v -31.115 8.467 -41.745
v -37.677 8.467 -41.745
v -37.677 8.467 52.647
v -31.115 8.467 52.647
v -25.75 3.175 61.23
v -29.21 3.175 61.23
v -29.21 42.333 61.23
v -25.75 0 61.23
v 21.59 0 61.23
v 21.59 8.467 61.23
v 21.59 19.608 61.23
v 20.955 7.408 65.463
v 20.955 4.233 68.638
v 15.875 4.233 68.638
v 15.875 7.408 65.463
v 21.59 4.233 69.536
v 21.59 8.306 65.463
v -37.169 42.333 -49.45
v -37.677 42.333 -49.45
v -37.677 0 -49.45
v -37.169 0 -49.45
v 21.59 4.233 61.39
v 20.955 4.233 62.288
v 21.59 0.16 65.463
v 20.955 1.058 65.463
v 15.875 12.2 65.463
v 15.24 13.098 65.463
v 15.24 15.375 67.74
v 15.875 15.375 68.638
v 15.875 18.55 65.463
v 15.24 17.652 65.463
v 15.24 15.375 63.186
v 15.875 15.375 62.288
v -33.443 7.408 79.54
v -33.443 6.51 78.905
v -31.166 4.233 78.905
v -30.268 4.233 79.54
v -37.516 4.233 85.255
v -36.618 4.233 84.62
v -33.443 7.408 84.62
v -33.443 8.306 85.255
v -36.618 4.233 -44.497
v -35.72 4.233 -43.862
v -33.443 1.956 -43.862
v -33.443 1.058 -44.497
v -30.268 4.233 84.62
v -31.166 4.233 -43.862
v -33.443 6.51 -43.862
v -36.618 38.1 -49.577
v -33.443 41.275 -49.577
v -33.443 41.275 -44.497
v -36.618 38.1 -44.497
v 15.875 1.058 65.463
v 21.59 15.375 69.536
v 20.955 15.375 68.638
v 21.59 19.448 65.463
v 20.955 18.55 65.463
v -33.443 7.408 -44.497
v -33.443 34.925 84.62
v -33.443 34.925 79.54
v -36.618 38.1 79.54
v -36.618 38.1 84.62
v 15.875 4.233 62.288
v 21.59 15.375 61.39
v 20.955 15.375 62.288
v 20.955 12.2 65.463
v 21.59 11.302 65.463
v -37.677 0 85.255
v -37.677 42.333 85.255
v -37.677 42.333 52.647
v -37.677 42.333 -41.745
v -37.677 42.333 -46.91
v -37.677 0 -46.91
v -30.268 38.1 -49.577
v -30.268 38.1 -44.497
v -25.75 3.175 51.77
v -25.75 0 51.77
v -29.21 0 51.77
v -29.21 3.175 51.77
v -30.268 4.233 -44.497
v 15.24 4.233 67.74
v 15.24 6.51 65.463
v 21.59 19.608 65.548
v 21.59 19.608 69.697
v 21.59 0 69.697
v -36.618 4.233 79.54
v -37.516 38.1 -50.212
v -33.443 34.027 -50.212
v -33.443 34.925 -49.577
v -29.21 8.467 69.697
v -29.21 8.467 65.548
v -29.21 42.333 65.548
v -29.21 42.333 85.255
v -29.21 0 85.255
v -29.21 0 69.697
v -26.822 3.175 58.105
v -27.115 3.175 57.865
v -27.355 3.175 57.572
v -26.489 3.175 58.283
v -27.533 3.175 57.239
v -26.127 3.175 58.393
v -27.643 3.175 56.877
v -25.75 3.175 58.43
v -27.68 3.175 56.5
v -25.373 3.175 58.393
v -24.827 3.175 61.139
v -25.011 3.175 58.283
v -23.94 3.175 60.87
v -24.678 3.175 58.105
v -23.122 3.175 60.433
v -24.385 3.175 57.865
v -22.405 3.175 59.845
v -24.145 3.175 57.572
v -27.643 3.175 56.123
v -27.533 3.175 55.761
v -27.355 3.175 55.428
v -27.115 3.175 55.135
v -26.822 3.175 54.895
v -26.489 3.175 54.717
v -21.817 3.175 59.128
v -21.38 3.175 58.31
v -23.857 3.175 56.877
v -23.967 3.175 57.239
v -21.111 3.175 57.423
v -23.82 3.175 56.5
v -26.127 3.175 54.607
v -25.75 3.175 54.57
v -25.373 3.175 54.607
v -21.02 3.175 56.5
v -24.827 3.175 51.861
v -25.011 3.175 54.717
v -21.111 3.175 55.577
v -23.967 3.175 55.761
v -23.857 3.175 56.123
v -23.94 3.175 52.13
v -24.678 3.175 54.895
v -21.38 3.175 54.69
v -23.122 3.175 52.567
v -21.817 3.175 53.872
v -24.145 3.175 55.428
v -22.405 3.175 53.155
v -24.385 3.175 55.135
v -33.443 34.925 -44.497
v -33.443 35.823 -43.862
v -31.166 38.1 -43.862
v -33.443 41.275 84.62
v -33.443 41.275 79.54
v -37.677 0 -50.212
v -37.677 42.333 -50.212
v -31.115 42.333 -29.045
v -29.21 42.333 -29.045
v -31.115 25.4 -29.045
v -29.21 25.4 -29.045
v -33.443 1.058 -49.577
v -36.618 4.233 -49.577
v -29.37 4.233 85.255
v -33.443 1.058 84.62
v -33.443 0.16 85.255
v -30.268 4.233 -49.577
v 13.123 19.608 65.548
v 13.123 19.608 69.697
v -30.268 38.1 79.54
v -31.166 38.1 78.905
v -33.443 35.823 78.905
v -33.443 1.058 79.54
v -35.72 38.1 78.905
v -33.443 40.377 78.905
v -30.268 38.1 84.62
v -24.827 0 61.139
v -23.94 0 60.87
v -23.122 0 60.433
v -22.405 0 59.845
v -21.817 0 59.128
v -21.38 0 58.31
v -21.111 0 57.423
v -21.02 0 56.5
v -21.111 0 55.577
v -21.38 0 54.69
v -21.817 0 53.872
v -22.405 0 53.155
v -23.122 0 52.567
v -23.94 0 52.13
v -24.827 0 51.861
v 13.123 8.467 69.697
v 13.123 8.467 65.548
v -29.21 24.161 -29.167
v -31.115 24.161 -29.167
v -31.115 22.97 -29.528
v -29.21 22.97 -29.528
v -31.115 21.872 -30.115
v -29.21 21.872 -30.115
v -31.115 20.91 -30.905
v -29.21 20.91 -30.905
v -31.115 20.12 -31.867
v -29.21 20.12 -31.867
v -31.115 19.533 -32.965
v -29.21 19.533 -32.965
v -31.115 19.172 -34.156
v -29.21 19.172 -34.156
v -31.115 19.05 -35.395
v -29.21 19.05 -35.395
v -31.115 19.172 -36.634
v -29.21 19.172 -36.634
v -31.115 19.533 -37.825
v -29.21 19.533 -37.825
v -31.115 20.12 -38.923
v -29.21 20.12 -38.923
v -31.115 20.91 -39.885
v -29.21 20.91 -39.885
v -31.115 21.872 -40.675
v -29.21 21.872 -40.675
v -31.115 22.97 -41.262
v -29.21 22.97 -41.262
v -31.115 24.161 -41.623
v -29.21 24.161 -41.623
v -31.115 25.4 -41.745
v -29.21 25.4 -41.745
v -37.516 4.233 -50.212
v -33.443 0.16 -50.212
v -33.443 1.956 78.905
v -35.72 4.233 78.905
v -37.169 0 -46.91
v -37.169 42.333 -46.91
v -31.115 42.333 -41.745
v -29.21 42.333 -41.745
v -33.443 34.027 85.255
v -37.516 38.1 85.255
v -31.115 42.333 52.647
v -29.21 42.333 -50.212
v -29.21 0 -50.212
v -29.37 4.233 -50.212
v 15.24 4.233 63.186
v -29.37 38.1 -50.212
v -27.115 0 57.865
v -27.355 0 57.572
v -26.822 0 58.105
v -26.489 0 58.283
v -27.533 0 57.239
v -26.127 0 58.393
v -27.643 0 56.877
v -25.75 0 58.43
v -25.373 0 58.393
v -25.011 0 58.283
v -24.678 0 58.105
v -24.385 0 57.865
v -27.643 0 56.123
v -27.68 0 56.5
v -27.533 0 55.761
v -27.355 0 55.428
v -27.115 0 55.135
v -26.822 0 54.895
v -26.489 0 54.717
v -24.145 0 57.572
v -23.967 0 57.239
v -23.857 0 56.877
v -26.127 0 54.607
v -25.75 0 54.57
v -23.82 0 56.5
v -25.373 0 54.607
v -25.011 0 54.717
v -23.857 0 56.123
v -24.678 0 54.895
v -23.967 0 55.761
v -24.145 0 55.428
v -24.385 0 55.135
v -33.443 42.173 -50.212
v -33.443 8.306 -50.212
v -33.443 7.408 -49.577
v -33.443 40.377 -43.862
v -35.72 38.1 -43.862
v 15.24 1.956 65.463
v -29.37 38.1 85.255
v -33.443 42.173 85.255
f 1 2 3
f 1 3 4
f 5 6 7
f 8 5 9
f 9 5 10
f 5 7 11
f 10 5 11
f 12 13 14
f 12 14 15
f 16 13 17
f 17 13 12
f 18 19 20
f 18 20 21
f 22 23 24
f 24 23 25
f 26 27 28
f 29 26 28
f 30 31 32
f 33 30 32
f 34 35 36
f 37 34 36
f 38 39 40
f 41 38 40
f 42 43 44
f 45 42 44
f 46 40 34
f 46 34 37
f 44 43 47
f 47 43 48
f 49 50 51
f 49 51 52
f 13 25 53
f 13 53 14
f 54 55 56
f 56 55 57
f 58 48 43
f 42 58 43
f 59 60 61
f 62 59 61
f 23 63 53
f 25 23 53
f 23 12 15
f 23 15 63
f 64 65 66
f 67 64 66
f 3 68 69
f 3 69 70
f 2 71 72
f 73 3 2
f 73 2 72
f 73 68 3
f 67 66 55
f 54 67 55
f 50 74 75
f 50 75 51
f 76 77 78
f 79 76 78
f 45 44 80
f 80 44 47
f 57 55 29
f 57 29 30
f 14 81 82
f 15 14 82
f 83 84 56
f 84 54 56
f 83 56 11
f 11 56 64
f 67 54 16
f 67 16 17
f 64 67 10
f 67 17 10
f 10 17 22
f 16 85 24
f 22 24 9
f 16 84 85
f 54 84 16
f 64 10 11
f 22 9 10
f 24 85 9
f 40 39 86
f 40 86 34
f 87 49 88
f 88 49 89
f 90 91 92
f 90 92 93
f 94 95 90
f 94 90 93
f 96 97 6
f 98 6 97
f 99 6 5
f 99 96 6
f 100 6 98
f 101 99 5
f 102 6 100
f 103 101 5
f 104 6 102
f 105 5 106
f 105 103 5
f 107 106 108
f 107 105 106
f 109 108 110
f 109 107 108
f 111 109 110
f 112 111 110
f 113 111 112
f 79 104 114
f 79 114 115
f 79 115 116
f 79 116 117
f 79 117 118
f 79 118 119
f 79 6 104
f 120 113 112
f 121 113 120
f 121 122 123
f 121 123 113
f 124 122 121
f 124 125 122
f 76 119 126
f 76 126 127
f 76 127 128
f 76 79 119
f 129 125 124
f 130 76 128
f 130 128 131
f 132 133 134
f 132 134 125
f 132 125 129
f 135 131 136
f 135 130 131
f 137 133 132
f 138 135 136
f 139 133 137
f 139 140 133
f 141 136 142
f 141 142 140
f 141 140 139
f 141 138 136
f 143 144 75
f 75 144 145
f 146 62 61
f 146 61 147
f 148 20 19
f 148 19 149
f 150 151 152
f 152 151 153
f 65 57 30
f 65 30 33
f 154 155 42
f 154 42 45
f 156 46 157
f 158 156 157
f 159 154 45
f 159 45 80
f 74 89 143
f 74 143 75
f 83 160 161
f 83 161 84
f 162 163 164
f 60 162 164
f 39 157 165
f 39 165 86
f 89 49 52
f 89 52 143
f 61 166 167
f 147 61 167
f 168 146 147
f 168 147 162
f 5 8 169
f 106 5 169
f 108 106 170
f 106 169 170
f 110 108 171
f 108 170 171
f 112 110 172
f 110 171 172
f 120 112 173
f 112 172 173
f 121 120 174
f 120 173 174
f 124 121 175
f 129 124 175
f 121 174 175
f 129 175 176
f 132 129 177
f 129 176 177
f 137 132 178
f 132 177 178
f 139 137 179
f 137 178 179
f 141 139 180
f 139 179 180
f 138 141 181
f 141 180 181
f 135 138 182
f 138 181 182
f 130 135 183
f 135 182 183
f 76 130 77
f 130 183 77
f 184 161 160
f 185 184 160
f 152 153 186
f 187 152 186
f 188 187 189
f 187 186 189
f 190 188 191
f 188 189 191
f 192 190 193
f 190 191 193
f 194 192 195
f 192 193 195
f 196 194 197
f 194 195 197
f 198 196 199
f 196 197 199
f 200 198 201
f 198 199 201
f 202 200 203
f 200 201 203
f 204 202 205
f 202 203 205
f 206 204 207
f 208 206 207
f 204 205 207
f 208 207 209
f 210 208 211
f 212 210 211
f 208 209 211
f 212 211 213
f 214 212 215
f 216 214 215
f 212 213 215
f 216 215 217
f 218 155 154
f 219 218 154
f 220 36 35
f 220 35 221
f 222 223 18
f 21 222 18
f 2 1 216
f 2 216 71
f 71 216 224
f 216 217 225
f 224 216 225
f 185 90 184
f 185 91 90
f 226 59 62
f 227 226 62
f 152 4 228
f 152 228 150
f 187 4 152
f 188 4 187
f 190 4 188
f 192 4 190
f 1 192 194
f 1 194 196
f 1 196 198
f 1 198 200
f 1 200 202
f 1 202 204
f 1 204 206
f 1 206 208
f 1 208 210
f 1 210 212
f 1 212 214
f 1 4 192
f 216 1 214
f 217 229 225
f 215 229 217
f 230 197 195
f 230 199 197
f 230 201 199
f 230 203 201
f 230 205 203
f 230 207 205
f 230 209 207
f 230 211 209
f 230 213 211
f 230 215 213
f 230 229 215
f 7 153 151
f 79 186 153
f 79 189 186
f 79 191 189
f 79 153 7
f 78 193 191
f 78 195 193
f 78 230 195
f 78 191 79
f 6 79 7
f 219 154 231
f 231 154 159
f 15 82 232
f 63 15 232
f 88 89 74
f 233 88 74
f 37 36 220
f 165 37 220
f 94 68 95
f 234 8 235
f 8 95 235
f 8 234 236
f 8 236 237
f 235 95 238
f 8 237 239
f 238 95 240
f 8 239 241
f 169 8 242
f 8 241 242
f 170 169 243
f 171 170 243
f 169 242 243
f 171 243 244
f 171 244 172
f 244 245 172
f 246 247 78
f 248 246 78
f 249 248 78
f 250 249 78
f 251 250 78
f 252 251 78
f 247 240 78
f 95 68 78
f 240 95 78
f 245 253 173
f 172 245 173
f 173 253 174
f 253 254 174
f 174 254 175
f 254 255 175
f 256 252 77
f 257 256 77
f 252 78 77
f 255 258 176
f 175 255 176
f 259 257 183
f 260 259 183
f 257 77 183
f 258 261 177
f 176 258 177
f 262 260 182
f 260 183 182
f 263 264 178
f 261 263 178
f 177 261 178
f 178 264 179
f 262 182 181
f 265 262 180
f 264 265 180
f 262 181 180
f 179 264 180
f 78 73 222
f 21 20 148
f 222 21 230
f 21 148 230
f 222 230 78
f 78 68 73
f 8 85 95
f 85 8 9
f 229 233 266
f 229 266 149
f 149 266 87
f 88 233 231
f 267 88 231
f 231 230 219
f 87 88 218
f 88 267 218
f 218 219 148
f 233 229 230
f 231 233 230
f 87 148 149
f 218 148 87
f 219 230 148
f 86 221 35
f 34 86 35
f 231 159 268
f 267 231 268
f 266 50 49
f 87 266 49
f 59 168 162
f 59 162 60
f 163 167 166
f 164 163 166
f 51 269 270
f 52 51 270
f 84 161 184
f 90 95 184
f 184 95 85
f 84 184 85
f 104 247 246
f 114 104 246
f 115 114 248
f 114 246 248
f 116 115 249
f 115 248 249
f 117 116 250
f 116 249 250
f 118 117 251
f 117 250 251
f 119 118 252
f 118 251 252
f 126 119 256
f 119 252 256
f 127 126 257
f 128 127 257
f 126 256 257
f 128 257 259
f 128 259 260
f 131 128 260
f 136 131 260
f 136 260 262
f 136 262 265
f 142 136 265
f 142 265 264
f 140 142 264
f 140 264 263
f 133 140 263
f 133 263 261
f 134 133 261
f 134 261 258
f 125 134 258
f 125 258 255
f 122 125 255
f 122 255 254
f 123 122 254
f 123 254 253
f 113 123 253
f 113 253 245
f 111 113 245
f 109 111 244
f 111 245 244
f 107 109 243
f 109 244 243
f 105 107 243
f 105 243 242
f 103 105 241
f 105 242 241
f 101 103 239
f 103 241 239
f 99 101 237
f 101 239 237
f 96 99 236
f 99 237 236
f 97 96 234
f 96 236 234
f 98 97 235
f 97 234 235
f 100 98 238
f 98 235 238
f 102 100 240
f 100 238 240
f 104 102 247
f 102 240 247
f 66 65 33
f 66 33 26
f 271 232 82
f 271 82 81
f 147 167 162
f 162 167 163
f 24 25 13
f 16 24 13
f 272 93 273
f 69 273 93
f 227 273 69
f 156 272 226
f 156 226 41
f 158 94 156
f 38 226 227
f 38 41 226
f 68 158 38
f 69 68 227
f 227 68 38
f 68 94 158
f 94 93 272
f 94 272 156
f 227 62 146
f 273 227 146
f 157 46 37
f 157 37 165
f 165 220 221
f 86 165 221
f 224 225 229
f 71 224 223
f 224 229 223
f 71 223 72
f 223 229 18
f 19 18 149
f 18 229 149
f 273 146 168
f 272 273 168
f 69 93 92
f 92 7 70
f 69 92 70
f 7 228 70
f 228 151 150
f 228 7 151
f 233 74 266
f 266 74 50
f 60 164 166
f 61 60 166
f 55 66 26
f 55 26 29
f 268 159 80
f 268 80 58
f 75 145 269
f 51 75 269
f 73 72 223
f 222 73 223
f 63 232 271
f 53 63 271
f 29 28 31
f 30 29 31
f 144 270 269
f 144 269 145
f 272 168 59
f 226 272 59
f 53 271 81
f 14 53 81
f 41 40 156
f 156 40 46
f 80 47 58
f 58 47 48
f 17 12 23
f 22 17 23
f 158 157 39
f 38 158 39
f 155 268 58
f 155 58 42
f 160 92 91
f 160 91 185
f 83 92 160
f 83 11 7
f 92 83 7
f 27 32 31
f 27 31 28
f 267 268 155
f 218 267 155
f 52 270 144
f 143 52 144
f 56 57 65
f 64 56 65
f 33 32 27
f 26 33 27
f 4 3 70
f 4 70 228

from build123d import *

# Parameters (mm, degrees)
BOSS_EXTRUDE2_DEPTH             = 8.466666667
BOSS_EXTRUDE4_DEPTH             = 3.175
F_24_0_152_DIAMETER_HOLE1_D     = 3.8608
F_24_0_152_DIAMETER_HOLE1_DEPTH = 3.175
BOSS_EXTRUDE5_DEPTH             = 33.866666667
SKETCH19_W                      = 8.466666666
SKETCH19_H                      = 8.466666667
BOSS_EXTRUDE7_DEPTH             = 11.141667582
BOSS_EXTRUDE6_DEPTH             = 4.318
RIGHTPINS_DEPTH                 = 6.35
LEFTPINS_DEPTH                  = 6.35
FRONTPINS_DEPTH                 = 6.35
PINCHAMFER_SIZE                 = 0.635
CUT_EXTRUDE1_REACH              = 109.894
CUT_EXTRUDE2_REACH              = 104.372
SKETCH21_W                      = 0.508
SKETCH21_H                      = 2.54


with BuildPart() as part:
    # Sketch3 → Boss-Extrude2 (new body)
    with BuildSketch(Plane(origin=(0, 0, 0), x_dir=(1, 0, 0), z_dir=(0, 1, 0))):
        Polygon((-29.210008467, 50.211675347), (-37.676675133, 50.211675347), (-37.676675133, -85.254991405), (-29.210008467, -85.254991405), (-29.210008467, -69.696666667), (21.589991533, -69.696666667), (21.589991533, -61.23), (-29.210008467, -61.23), align=None)
    extrude(amount=BOSS_EXTRUDE2_DEPTH)

    # Sketch12 → Boss-Extrude4 (add)
    with BuildSketch(Plane(origin=(0, 0, 0), x_dir=(1, 0, 0), z_dir=(0, 1, 0))):
        with BuildLine():
            Line((-25.75, -51.77), (-29.210008467, -51.77))
            Line((-29.210008467, -51.77), (-29.210008467, -61.23))
            Line((-29.210008467, -61.23), (-25.75, -61.23))
            ThreePointArc((-25.75, -61.23), (-21.02, -56.5), (-25.75, -51.77))
        make_face()
    extrude(amount=BOSS_EXTRUDE4_DEPTH)

    # #24 (0.152) Diameter Hole1
    with Locations(Plane(origin=(0, 3.175, 0), x_dir=(1, 0, 0), z_dir=(0, 1, 0))):
        with Locations((-25.75, 56.5), (-25.75, -56.5)):
            Hole(F_24_0_152_DIAMETER_HOLE1_D / 2, depth=F_24_0_152_DIAMETER_HOLE1_DEPTH)

    # Sketch16 → Boss-Extrude5 (add)
    with BuildSketch(Plane(origin=(0, 8.466666667, 0), x_dir=(1, 0, 0), z_dir=(0, 1, 0))):
        Polygon((-37.676675133, -85.254991405), (-37.676675133, -52.64717283), (-31.115008467, -52.64717283), (-31.115008467, 41.74500868), (-37.676675133, 41.74500868), (-37.676675133, 50.211675347), (-29.210008467, 50.211675347), (-29.210008467, -85.254991405), align=None)
    extrude(amount=BOSS_EXTRUDE5_DEPTH)

    # Sketch19 → Boss-Extrude7 (add)
    with BuildSketch(Plane(origin=(0, 8.466666667, 0), x_dir=(1, 0, 0), z_dir=(0, 1, 0))):
        with Locations((17.3566582, -65.463333334)):
            Rectangle(SKETCH19_W, SKETCH19_H)
    extrude(amount=BOSS_EXTRUDE7_DEPTH)

    # Sketch18 → Boss-Extrude6 (add)
    with BuildSketch(Plane(origin=(0, 0, 61.23), x_dir=(-1, 0, 0), z_dir=(0, 0, -1))):
        Polygon((-21.589991533, 19.608334249), (29.210008467, 42.333333333), (29.210008467, 8.466666667), (-13.123324867, 8.466666667), (-13.123324867, 19.608334249), align=None)
    extrude(amount=-BOSS_EXTRUDE6_DEPTH)

    # Sketch4 → RightPins (cut)
    with BuildSketch(Plane.XY.offset(85.254991405)):
        Polygon((-36.6183418, 4.233333333), (-33.4433418, 7.408333333), (-30.2683418, 4.233333333), (-33.4433418, 1.058333333), align=None)
        Polygon((-36.6183418, 38.1), (-33.4433418, 41.275), (-30.2683418, 38.1), (-33.4433418, 34.925), align=None)
    extrude(amount=-RIGHTPINS_DEPTH, mode=Mode.SUBTRACT)

    # Sketch5 → LeftPins (cut)
    with BuildSketch(Plane(origin=(0, 0, -50.211675347), x_dir=(-1, 0, 0), z_dir=(0, 0, -1))):
        Polygon((30.2683418, 4.233333333), (33.4433418, 7.408333333), (36.6183418, 4.233333333), (33.4433418, 1.058333333), align=None)
        Polygon((30.2683418, 38.1), (33.4433418, 41.275), (36.6183418, 38.1), (33.4433418, 34.925), align=None)
    extrude(amount=-LEFTPINS_DEPTH, mode=Mode.SUBTRACT)

    # Sketch11 → FrontPins (cut)
    with BuildSketch(Plane(origin=(21.589991533, 0, 0), x_dir=(0, 0, -1), z_dir=(1, 0, 0))):
        Polygon((-68.638333333, 4.233333333), (-65.463333333, 7.408333333), (-62.288333333, 4.233333333), (-65.463333333, 1.058333333), align=None)
        Polygon((-68.638333333, 15.375000915), (-65.463333333, 18.550000915), (-62.288333333, 15.375000915), (-65.463333333, 12.200000915), align=None)
    extrude(amount=-FRONTPINS_DEPTH, mode=Mode.SUBTRACT)

    # PinChamfer
    pinchamfer_edges = [part.edges().sort_by_distance(p)[0] for p in [
        (-35.0308418, 2.645833333, 78.904991405),
        (-35.0308418, 5.820833333, 78.904991405),
        (-31.8558418, 5.820833333, 78.904991405),
        (-31.8558418, 2.645833333, 78.904991405),
        (-35.0308418, 2.645833333, 85.254991405),
        (-31.8558418, 2.645833333, 85.254991405),
        (-31.8558418, 5.820833333, 85.254991405),
        (-35.0308418, 5.820833333, 85.254991405),
        (-35.0308418, 36.5125, 78.904991405),
        (-35.0308418, 39.6875, 78.904991405),
        (-31.8558418, 39.6875, 78.904991405),
        (-31.8558418, 36.5125, 78.904991405),
        (-35.0308418, 36.5125, 85.254991405),
        (-31.8558418, 36.5125, 85.254991405),
        (-31.8558418, 39.6875, 85.254991405),
        (-35.0308418, 39.6875, 85.254991405),
        (-31.8558418, 2.645833333, -43.861675347),
        (-31.8558418, 5.820833333, -43.861675347),
        (-35.0308418, 5.820833333, -43.861675347),
        (-35.0308418, 2.645833333, -43.861675347),
        (-31.8558418, 2.645833333, -50.211675347),
        (-35.0308418, 2.645833333, -50.211675347),
        (-35.0308418, 5.820833333, -50.211675347),
        (-31.8558418, 5.820833333, -50.211675347),
        (-31.8558418, 36.5125, -43.861675347),
        (-31.8558418, 39.6875, -43.861675347),
        (-35.0308418, 39.6875, -43.861675347),
        (-35.0308418, 36.5125, -43.861675347),
        (-31.8558418, 36.5125, -50.211675347),
        (-35.0308418, 36.5125, -50.211675347),
        (-35.0308418, 39.6875, -50.211675347),
        (-31.8558418, 39.6875, -50.211675347),
        (15.239991533, 2.645833333, 67.050833333),
        (15.239991533, 5.820833333, 67.050833333),
        (15.239991533, 5.820833333, 63.875833333),
        (15.239991533, 2.645833333, 63.875833333),
        (21.589991533, 2.645833333, 67.050833333),
        (21.589991533, 2.645833333, 63.875833333),
        (21.589991533, 5.820833333, 63.875833333),
        (21.589991533, 5.820833333, 67.050833333),
        (15.239991533, 13.787500915, 67.050833333),
        (15.239991533, 16.962500915, 67.050833333),
        (15.239991533, 16.962500915, 63.875833333),
        (15.239991533, 13.787500915, 63.875833333),
        (21.589991533, 13.787500915, 67.050833333),
        (21.589991533, 13.787500915, 63.875833333),
        (21.589991533, 16.962500915, 63.875833333),
        (21.589991533, 16.962500915, 67.050833333),
    ]]
    chamfer(pinchamfer_edges, length=PINCHAMFER_SIZE)

    # Sketch20 → Cut-Extrude1 (cut, up to next)
    with BuildSketch(Plane(origin=(-29.210008467, 0, 0), x_dir=(0, 0, -1), z_dir=(1, 0, 0)), mode=Mode.PRIVATE) as cut_extrude1_sk1:
        with BuildLine():
            Line((41.74500868, 25.4), (41.74500868, 42.333333333))
            Line((41.74500868, 42.333333333), (29.04500868, 42.333333333))
            Line((29.04500868, 42.333333333), (29.04500868, 25.4))
            ThreePointArc((29.04500868, 25.4), (35.39500868, 19.05), (41.74500868, 25.4))
        make_face()
    cut_extrude1_tool1 = extrude(cut_extrude1_sk1.sketch, amount=-CUT_EXTRUDE1_REACH, mode=Mode.PRIVATE) & part.part
    add(cut_extrude1_tool1.solids().sort_by_distance((-29.210008, 31.327209, -35.395009))[0], mode=Mode.SUBTRACT)

    # Sketch21 → Cut-Extrude2 (cut, up to next)
    with BuildSketch(Plane(origin=(0, 42.333333333, 0), x_dir=(1, 0, 0), z_dir=(0, 1, 0)), mode=Mode.PRIVATE) as cut_extrude2_sk1:
        with Locations((-37.422675133, 48.179675347)):
            Rectangle(SKETCH21_W, SKETCH21_H)
    cut_extrude2_tool1 = extrude(cut_extrude2_sk1.sketch, amount=-CUT_EXTRUDE2_REACH, mode=Mode.PRIVATE) & part.part
    add(cut_extrude2_tool1.solids().sort_by_distance((-37.422675, 42.333333, -48.179675))[0], mode=Mode.SUBTRACT)


solid = part.part
